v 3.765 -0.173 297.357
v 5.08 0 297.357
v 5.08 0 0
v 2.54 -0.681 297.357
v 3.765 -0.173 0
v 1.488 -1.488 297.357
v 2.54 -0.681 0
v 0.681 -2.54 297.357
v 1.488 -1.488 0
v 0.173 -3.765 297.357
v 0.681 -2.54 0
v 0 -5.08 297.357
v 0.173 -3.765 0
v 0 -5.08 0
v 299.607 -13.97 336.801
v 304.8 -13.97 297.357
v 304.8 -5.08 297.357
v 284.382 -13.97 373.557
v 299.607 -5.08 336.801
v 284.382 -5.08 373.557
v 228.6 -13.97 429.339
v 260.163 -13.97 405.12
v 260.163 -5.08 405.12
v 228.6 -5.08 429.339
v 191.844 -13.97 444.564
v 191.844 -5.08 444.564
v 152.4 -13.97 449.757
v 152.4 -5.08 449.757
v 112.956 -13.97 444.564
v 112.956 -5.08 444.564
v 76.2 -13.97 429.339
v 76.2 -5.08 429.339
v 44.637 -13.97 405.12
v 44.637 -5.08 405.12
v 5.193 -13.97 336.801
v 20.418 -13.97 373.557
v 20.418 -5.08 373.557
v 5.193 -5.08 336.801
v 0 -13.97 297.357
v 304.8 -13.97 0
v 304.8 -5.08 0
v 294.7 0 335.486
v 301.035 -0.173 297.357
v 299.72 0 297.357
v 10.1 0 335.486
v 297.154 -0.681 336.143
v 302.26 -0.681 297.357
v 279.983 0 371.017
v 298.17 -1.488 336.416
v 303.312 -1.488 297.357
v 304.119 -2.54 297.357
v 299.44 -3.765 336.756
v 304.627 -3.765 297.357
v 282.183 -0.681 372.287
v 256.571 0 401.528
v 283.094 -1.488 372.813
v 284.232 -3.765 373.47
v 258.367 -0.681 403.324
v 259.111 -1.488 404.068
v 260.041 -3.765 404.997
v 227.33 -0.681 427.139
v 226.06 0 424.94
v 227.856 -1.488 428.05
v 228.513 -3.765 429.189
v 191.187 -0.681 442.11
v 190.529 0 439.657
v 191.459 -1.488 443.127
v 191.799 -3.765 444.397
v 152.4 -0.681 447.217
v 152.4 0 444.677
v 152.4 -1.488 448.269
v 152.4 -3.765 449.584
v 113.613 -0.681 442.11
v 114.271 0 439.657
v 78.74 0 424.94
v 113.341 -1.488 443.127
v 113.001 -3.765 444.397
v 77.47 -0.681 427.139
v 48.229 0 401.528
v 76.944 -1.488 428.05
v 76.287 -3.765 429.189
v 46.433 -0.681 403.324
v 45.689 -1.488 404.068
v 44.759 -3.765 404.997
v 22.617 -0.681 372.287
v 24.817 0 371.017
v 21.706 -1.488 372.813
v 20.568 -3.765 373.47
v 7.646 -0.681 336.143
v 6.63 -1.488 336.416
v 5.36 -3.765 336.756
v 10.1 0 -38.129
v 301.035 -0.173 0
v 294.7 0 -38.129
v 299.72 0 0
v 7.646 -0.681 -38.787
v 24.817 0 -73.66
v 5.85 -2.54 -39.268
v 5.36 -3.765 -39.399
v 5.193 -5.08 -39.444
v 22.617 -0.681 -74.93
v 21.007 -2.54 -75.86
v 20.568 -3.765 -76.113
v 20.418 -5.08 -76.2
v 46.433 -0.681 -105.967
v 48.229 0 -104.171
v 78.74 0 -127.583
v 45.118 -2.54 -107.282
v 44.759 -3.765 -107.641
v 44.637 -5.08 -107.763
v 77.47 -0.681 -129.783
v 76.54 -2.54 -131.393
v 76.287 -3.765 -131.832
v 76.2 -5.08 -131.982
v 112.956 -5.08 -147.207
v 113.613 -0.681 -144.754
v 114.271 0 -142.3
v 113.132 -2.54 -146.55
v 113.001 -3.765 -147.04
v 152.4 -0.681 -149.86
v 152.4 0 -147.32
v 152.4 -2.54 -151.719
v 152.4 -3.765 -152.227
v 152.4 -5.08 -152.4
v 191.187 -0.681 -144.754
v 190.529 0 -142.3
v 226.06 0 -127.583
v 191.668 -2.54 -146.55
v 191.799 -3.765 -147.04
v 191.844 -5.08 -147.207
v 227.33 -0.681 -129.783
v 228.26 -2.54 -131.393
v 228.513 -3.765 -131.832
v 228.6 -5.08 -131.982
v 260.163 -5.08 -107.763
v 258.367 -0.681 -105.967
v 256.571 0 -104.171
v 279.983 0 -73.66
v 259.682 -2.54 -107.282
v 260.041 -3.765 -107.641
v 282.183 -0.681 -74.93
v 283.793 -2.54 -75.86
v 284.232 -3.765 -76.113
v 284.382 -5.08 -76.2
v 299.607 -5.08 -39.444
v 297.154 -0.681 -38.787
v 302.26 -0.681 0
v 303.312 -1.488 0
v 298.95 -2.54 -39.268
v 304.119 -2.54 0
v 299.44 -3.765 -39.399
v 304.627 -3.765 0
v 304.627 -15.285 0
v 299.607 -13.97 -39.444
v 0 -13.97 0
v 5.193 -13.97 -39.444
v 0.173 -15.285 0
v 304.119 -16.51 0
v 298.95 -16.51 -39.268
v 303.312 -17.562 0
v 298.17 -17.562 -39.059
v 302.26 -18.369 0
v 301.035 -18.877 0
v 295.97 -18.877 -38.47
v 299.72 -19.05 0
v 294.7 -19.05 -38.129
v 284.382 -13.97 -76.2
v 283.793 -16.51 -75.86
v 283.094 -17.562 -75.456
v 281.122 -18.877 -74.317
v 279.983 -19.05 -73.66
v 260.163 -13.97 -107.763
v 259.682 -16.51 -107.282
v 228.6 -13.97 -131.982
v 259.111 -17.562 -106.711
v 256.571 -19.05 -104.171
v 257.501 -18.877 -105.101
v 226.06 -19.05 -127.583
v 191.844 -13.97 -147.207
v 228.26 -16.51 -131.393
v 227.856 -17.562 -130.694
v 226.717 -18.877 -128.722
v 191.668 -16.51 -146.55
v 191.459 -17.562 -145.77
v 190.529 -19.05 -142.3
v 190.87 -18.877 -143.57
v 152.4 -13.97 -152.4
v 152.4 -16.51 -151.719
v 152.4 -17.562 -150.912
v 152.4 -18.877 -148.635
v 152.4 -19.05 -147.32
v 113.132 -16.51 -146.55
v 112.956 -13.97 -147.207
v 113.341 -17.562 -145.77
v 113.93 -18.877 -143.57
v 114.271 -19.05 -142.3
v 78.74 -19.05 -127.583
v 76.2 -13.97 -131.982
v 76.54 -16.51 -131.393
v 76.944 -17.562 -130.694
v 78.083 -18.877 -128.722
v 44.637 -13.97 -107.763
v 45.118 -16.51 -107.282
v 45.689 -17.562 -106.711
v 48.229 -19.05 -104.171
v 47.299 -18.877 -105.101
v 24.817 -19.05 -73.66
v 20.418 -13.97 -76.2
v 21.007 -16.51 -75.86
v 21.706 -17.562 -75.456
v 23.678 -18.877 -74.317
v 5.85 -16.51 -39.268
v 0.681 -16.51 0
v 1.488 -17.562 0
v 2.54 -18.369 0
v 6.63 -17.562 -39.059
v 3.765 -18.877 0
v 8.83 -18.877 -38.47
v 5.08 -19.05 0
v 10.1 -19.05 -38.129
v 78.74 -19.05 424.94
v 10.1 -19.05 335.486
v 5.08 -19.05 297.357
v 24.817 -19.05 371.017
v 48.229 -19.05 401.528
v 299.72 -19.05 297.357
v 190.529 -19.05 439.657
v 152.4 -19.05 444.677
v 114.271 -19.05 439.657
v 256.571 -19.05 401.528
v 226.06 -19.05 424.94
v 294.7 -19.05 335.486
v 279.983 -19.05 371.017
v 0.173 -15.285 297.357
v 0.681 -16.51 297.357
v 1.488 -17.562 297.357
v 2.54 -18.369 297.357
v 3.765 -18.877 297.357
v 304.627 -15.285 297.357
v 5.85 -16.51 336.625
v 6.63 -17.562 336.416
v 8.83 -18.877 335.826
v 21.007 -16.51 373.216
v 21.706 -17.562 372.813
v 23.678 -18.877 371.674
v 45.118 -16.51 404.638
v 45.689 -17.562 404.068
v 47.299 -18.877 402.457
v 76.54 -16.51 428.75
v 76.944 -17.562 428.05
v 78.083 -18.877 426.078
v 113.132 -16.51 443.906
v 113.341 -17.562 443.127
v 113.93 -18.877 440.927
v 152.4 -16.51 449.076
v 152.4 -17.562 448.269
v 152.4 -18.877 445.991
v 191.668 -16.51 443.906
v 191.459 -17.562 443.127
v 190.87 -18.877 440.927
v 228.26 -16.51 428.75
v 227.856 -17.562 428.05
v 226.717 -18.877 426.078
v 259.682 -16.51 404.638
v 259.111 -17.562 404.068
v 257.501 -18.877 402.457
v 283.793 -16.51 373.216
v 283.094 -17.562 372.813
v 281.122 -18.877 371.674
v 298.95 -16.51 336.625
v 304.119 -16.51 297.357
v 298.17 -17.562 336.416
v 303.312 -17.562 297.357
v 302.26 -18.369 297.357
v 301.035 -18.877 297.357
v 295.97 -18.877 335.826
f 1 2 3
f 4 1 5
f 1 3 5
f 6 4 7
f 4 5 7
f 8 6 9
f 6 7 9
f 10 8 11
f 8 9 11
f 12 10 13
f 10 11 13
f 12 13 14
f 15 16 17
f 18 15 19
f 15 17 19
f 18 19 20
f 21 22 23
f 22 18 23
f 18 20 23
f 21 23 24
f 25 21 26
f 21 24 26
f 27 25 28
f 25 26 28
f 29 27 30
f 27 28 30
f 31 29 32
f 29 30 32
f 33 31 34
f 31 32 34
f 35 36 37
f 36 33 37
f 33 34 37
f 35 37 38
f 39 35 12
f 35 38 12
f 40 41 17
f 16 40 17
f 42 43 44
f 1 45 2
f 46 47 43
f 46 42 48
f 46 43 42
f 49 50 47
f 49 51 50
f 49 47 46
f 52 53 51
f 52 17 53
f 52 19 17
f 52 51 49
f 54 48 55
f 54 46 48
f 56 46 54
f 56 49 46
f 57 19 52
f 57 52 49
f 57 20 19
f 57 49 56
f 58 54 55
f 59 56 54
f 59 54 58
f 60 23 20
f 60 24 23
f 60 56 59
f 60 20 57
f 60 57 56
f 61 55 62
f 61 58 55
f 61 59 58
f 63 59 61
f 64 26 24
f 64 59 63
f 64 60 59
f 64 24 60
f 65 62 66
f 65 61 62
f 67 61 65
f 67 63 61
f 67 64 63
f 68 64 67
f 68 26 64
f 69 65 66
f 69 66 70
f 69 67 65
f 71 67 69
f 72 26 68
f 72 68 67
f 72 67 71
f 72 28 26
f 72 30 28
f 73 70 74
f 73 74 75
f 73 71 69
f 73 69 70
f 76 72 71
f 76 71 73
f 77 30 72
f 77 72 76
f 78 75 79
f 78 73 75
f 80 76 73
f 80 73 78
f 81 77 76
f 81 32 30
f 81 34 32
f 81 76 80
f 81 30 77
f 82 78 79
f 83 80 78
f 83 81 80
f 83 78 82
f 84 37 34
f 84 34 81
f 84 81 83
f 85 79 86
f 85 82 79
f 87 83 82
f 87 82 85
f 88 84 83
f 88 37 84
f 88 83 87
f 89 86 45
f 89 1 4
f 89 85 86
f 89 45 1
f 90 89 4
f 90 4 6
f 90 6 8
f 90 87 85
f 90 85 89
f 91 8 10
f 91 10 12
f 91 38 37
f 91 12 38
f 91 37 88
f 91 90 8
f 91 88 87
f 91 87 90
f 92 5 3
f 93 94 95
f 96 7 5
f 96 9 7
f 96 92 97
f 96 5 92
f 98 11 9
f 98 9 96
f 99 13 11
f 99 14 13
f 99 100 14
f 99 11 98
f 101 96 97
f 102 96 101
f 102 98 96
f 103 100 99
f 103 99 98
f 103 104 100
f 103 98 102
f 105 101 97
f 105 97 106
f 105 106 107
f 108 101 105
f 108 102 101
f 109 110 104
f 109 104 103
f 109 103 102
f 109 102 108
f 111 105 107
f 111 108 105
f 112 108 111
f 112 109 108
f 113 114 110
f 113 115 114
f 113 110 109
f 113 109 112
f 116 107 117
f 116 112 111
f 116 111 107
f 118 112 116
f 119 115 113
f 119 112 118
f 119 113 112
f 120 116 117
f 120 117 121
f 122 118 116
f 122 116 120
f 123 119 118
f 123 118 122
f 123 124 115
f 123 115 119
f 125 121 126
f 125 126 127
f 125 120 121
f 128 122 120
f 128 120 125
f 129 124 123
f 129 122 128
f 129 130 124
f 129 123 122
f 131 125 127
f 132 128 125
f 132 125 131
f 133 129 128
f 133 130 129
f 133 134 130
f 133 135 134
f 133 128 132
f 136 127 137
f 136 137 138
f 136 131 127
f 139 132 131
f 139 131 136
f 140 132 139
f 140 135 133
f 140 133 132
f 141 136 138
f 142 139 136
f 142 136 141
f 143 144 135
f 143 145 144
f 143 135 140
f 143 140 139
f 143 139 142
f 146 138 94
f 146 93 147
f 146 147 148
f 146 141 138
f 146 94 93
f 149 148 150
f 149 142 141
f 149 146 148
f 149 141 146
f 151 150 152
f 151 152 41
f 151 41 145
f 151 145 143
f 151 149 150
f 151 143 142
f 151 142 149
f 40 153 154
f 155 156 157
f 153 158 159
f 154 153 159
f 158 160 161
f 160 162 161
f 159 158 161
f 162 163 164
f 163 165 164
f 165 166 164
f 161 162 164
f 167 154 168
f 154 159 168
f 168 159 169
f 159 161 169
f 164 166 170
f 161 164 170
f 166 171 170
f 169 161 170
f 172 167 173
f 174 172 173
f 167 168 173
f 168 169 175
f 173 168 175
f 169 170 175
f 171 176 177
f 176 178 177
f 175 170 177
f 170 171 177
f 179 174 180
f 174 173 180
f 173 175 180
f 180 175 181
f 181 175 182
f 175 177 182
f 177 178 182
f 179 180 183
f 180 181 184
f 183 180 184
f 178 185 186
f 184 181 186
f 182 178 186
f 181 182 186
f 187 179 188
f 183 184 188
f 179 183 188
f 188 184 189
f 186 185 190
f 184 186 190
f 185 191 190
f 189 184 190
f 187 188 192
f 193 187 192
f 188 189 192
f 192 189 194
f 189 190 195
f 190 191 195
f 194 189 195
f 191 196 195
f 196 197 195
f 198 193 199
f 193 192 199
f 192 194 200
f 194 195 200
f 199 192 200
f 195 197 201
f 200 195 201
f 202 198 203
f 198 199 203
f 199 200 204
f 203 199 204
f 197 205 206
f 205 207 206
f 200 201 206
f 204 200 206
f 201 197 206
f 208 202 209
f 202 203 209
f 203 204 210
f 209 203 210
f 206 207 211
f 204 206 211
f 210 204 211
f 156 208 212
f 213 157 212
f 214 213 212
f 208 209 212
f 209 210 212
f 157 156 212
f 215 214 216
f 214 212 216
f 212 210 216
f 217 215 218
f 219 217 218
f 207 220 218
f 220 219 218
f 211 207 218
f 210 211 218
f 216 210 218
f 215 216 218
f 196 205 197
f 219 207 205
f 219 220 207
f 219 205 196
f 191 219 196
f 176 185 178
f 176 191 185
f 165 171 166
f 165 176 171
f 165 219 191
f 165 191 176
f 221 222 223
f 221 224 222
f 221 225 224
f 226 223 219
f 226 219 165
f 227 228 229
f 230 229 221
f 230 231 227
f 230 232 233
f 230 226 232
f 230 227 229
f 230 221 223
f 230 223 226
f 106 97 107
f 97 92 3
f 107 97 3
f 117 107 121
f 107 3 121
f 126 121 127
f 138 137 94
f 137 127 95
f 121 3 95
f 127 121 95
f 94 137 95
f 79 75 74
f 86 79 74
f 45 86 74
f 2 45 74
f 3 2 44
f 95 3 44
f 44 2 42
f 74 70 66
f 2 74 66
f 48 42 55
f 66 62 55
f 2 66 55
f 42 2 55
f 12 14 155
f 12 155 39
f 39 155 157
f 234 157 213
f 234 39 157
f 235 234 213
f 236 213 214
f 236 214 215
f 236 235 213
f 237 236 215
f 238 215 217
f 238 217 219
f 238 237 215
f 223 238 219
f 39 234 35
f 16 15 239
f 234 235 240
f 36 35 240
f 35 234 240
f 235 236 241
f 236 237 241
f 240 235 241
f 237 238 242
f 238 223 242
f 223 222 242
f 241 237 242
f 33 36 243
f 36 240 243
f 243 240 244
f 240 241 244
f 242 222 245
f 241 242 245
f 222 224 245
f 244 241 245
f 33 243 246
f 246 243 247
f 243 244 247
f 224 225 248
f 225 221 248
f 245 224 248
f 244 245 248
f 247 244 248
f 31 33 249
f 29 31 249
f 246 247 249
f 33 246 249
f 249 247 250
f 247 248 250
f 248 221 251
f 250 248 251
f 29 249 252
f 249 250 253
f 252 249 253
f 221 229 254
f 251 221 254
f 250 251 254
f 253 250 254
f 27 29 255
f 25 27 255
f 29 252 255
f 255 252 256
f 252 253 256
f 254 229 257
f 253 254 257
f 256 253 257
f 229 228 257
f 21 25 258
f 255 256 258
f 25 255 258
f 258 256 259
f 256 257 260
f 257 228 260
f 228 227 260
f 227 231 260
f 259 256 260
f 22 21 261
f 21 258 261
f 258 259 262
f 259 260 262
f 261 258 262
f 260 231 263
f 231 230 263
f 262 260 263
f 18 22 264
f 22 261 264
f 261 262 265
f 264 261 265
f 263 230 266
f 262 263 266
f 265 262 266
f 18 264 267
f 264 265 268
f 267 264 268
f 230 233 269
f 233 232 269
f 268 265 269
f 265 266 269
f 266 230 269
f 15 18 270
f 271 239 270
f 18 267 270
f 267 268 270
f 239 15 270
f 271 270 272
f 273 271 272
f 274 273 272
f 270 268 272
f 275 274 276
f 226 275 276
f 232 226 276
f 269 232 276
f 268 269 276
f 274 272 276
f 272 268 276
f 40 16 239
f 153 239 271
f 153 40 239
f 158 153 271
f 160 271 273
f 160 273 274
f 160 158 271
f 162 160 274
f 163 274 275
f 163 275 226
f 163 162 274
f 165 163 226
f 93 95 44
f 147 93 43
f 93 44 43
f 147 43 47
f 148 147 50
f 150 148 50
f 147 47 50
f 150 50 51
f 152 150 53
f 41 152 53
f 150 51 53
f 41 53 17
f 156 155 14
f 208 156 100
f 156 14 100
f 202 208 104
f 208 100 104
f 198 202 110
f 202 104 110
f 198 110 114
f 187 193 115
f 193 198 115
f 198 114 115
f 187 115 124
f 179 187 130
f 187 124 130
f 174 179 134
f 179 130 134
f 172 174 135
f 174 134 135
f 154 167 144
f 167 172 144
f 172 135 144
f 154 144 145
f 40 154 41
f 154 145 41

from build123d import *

# Parameters (mm, degrees)
F0_W     = 304.8
F0_H     = 457.2
F1_DEPTH = 19.05
F2_R     = 5.08
F3_R     = 5.08
F4_W     = 304.8
F4_H     = 297.3566651344
F5_DEPTH = 19.05
F7_R     = 5.08
F8_R     = 5.08


with BuildPart() as f1:
    # F0 (on Front) → F1 (new body)
    with BuildSketch(Plane.XZ):
        with BuildLine():
            ThreePointArc((304.8, 457.2), (152.4, 609.6), (0, 457.2))
            Line((0, 457.2), (304.8, 457.2))
        make_face()
        with Locations((152.4, 228.6)):
            Rectangle(F0_W, F0_H)
        with BuildLine():
            Line((304.8, 0), (0, 0))
            ThreePointArc((0, 0), (152.4, -152.4), (304.8, 0))
        make_face()
    extrude(amount=F1_DEPTH)

    # F2
    f2_edges = [f1.edges().sort_by_distance(p)[0] for p in [
        (0, -19.05, 228.6),
        (152.4, -19.05, 609.6),
        (304.8, -19.05, 228.6),
        (152.4, -19.05, -152.4),
    ]]
    fillet(f2_edges, radius=F2_R)

    # F3
    f3_edges = [f1.edges().sort_by_distance(p)[0] for p in [
        (304.8, 0, 228.6),
        (152.4, 0, 609.6),
        (0, 0, 228.6),
        (152.4, 0, -152.4),
    ]]
    fillet(f3_edges, radius=F3_R)


with BuildPart() as f5:
    # F4 (on Front) → F5 (new body)
    with BuildSketch(Plane.XZ):
        with Locations((152.4, 148.6783325672)):
            Rectangle(F4_W, F4_H)
        with BuildLine():
            ThreePointArc((304.8, 297.3566651344), (152.4, 449.7566651344), (0, 297.3566651344))
            Line((0, 297.3566651344), (304.8, 297.3566651344))
        make_face()
        with BuildLine():
            Line((304.8, 0), (0, 0))
            ThreePointArc((0, 0), (152.4, -152.4), (304.8, 0))
        make_face()
    extrude(amount=F5_DEPTH)

    # F7
    f7_edges = [f5.edges().sort_by_distance(p)[0] for p in [
        (0, -19.05, 148.678333),
        (152.4, -19.05, 449.756665),
        (304.8, -19.05, 148.678333),
        (152.4, -19.05, -152.4),
    ]]
    fillet(f7_edges, radius=F7_R)

    # F8
    f8_edges = [f5.edges().sort_by_distance(p)[0] for p in [
        (304.8, 0, 148.678333),
        (152.4, 0, 449.756665),
        (0, 0, 148.678333),
        (152.4, 0, -152.4),
    ]]
    fillet(f8_edges, radius=F8_R)


solid = f5.part
